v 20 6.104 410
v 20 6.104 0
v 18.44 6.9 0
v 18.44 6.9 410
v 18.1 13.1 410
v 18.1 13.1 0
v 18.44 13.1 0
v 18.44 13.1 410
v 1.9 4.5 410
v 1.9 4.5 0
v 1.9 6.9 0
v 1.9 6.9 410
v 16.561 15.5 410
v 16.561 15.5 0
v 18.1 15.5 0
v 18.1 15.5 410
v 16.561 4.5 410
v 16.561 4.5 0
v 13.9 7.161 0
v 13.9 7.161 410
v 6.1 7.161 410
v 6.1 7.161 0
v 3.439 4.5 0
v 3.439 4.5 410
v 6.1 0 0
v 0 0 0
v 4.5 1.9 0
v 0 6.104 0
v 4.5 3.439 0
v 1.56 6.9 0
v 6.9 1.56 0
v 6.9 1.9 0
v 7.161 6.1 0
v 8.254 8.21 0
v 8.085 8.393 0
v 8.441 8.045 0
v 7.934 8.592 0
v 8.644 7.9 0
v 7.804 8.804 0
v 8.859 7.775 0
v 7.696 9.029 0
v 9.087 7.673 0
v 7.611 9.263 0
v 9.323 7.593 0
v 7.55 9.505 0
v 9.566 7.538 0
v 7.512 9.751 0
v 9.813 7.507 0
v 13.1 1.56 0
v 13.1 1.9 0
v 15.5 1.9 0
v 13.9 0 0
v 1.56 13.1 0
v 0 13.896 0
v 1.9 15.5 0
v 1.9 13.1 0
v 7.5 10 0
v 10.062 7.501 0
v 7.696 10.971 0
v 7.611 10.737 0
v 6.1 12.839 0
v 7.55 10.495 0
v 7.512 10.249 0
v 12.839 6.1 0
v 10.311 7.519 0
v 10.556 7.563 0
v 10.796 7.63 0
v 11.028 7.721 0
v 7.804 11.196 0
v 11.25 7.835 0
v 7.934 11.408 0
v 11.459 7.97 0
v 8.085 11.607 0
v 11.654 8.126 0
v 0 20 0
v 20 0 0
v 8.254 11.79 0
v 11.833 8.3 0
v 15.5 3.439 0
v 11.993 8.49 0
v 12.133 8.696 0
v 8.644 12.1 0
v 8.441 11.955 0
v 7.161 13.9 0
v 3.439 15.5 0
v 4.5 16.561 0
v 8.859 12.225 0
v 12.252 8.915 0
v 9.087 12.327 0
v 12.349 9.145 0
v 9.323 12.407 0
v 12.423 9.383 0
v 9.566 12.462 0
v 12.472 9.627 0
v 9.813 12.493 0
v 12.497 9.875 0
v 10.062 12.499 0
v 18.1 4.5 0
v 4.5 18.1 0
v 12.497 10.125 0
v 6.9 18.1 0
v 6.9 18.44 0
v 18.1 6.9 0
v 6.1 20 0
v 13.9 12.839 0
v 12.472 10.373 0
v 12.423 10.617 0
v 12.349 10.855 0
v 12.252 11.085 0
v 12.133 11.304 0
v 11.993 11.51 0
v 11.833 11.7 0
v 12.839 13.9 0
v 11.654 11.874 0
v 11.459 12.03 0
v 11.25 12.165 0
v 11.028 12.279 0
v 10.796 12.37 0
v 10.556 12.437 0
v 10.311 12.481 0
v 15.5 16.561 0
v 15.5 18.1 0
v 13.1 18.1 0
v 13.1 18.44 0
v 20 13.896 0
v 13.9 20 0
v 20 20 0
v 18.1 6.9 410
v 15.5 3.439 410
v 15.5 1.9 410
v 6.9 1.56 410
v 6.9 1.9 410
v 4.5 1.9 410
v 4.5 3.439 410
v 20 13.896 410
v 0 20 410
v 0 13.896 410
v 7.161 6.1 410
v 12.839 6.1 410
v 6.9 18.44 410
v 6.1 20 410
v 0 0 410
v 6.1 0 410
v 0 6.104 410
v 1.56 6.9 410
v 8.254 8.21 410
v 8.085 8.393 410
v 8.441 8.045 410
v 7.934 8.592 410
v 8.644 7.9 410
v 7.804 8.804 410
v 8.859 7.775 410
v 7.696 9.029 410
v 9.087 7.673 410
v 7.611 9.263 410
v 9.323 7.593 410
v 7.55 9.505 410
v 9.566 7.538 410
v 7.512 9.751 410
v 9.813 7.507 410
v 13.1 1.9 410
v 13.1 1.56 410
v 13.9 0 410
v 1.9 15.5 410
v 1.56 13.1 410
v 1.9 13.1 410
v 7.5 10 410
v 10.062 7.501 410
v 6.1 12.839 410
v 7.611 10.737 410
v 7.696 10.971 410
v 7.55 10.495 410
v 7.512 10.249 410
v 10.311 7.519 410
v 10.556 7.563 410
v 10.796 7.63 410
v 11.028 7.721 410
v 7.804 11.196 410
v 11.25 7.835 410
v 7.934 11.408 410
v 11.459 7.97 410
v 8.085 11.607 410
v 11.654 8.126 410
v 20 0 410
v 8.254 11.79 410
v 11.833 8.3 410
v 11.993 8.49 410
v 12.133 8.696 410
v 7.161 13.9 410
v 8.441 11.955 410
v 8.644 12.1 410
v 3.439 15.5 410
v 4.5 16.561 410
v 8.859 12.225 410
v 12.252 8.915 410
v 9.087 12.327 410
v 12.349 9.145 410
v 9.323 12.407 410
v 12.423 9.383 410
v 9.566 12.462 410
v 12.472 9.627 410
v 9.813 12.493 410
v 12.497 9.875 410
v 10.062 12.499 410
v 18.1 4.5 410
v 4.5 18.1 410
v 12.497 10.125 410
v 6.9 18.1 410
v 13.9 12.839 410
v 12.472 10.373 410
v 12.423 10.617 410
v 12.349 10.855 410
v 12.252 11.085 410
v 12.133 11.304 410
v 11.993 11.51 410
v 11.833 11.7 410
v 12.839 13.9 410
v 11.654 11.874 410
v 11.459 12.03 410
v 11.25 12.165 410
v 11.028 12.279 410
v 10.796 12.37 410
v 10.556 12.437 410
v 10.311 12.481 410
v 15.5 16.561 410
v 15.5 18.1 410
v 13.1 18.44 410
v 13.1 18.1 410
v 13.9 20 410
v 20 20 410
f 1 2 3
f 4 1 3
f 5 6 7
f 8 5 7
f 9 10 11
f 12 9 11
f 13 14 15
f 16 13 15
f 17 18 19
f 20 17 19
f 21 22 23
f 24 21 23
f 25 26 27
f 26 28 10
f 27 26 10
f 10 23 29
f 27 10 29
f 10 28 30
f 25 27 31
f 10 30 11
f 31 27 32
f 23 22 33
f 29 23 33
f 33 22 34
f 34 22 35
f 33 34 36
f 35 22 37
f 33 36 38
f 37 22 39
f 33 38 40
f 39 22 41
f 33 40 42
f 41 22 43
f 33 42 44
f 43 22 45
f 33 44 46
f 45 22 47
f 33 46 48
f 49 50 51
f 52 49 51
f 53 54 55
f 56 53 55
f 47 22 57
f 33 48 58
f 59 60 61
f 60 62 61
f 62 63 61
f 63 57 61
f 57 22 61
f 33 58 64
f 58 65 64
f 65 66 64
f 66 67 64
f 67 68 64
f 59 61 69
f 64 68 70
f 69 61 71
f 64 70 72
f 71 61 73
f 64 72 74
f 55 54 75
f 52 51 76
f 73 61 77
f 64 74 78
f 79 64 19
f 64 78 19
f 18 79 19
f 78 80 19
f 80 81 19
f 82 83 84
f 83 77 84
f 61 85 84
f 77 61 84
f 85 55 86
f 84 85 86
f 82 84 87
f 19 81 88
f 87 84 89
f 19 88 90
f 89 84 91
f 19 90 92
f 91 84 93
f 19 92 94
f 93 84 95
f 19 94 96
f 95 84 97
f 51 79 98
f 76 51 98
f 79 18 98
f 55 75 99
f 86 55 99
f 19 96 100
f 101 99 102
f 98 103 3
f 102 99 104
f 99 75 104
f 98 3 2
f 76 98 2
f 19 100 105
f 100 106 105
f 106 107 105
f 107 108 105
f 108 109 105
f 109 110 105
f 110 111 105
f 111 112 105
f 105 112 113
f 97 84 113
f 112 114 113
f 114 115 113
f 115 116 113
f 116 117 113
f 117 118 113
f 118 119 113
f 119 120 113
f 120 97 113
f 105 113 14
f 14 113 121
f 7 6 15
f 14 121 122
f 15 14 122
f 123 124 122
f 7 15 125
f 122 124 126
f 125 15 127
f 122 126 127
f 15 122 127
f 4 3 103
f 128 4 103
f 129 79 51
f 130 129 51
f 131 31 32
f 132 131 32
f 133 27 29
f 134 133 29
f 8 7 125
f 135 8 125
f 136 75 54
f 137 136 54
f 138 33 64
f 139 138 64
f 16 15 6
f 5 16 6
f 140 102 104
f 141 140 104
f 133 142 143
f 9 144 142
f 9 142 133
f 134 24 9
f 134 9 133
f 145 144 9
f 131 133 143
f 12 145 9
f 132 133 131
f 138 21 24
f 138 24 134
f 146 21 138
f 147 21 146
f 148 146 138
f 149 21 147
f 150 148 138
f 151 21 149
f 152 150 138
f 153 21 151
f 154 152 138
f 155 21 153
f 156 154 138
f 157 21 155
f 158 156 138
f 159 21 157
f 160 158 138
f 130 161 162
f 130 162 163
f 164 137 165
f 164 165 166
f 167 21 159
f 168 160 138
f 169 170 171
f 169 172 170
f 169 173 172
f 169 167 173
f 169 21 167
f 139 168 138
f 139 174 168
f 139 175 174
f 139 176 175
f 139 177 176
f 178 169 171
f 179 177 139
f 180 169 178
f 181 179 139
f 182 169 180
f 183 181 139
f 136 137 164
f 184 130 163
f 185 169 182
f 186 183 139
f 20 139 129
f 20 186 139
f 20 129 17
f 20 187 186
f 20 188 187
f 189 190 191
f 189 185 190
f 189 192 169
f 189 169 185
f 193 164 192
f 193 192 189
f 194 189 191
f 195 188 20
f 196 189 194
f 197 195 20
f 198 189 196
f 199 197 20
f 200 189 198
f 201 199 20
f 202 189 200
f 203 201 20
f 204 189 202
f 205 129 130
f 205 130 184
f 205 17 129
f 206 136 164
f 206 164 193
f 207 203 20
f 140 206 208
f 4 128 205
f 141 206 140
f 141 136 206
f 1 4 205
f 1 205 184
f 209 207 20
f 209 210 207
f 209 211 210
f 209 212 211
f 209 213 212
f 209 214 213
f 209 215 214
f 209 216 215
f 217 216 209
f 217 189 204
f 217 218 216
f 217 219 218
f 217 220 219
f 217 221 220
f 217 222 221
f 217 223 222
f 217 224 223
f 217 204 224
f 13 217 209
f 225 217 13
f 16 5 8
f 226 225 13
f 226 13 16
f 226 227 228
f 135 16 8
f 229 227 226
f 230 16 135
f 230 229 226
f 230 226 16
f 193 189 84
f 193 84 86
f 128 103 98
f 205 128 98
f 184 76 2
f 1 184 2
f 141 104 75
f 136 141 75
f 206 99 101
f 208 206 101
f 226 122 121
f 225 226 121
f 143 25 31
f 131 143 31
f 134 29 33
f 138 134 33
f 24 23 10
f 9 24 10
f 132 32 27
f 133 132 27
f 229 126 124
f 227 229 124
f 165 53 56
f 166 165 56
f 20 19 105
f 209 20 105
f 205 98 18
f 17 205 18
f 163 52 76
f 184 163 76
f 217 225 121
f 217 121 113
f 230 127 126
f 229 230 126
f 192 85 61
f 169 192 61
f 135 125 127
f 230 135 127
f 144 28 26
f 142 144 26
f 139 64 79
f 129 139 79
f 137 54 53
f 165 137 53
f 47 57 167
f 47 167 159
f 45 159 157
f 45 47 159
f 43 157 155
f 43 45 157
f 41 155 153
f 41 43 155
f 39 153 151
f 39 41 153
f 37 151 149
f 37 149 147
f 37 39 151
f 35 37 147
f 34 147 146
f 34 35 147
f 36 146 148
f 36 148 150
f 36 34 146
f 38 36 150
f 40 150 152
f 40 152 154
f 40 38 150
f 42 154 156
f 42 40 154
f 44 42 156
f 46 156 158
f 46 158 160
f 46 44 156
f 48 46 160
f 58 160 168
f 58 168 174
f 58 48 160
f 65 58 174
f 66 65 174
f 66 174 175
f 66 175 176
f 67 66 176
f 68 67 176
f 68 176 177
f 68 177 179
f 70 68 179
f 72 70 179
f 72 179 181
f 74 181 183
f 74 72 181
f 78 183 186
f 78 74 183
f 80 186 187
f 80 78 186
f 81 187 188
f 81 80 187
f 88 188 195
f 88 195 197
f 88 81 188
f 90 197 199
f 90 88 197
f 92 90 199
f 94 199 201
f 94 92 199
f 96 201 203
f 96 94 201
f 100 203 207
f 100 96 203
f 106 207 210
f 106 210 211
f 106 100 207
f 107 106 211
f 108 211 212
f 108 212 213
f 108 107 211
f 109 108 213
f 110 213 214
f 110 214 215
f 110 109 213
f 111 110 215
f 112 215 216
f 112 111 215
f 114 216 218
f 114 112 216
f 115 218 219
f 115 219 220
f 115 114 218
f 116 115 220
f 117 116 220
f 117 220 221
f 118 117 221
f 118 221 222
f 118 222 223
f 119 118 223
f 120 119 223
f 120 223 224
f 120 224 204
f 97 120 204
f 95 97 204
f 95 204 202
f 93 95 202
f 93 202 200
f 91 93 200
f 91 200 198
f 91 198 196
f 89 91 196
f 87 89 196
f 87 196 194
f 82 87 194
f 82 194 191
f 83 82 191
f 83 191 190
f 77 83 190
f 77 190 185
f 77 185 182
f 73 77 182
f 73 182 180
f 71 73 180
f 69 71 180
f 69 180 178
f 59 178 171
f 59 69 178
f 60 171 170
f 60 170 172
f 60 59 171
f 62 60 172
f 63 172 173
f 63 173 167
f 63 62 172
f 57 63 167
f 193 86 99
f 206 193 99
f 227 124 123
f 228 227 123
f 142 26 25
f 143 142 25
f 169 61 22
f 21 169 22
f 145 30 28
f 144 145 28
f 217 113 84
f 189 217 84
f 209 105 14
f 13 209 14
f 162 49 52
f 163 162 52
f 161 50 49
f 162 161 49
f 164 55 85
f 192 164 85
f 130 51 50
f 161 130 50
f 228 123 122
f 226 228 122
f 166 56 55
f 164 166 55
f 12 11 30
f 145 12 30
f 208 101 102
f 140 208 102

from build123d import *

# Parameters (mm, degrees)
SKETCH1_R           = 2.5
BOSS_EXTRUDE1_DEPTH = 410


with BuildPart() as part:
    # Sketch1 → Boss-Extrude1 (new body)
    with BuildSketch(Plane.XY):
        Polygon((6.1, 20), (0, 20), (0, 13.895792909), (1.56, 13.1), (1.9, 13.1), (1.9, 15.5), (3.439339828, 15.5), (6.1, 12.839339828), (6.1, 7.160660172), (3.439339828, 4.5), (1.9, 4.5), (1.9, 6.9), (1.56, 6.9), (0, 6.104207091), (0, 0), (6.1, 0), (6.9, 1.56), (6.9, 1.9), (4.5, 1.9), (4.5, 3.439339828), (7.160660172, 6.1), (12.839339828, 6.1), (15.5, 3.439339828), (15.5, 1.9), (13.1, 1.9), (13.1, 1.56), (13.9, 0), (20, 0), (20, 6.104207091), (18.44, 6.9), (18.1, 6.9), (18.1, 4.5), (16.560660172, 4.5), (13.9, 7.160660172), (13.9, 12.839339828), (16.560660172, 15.5), (18.1, 15.5), (18.1, 13.1), (18.44, 13.1), (20, 13.895792909), (20, 20), (13.9, 20), (13.1, 18.44), (13.1, 18.1), (15.5, 18.1), (15.5, 16.560660172), (12.839339828, 13.9), (7.160660172, 13.9), (4.5, 16.560660172), (4.5, 18.1), (6.9, 18.1), (6.9, 18.44), align=None)
        with Locations(Location((10, 10, 0), (0, 0, 180))):
            Circle(SKETCH1_R, mode=Mode.SUBTRACT)
    extrude(amount=BOSS_EXTRUDE1_DEPTH)


solid = part.part
